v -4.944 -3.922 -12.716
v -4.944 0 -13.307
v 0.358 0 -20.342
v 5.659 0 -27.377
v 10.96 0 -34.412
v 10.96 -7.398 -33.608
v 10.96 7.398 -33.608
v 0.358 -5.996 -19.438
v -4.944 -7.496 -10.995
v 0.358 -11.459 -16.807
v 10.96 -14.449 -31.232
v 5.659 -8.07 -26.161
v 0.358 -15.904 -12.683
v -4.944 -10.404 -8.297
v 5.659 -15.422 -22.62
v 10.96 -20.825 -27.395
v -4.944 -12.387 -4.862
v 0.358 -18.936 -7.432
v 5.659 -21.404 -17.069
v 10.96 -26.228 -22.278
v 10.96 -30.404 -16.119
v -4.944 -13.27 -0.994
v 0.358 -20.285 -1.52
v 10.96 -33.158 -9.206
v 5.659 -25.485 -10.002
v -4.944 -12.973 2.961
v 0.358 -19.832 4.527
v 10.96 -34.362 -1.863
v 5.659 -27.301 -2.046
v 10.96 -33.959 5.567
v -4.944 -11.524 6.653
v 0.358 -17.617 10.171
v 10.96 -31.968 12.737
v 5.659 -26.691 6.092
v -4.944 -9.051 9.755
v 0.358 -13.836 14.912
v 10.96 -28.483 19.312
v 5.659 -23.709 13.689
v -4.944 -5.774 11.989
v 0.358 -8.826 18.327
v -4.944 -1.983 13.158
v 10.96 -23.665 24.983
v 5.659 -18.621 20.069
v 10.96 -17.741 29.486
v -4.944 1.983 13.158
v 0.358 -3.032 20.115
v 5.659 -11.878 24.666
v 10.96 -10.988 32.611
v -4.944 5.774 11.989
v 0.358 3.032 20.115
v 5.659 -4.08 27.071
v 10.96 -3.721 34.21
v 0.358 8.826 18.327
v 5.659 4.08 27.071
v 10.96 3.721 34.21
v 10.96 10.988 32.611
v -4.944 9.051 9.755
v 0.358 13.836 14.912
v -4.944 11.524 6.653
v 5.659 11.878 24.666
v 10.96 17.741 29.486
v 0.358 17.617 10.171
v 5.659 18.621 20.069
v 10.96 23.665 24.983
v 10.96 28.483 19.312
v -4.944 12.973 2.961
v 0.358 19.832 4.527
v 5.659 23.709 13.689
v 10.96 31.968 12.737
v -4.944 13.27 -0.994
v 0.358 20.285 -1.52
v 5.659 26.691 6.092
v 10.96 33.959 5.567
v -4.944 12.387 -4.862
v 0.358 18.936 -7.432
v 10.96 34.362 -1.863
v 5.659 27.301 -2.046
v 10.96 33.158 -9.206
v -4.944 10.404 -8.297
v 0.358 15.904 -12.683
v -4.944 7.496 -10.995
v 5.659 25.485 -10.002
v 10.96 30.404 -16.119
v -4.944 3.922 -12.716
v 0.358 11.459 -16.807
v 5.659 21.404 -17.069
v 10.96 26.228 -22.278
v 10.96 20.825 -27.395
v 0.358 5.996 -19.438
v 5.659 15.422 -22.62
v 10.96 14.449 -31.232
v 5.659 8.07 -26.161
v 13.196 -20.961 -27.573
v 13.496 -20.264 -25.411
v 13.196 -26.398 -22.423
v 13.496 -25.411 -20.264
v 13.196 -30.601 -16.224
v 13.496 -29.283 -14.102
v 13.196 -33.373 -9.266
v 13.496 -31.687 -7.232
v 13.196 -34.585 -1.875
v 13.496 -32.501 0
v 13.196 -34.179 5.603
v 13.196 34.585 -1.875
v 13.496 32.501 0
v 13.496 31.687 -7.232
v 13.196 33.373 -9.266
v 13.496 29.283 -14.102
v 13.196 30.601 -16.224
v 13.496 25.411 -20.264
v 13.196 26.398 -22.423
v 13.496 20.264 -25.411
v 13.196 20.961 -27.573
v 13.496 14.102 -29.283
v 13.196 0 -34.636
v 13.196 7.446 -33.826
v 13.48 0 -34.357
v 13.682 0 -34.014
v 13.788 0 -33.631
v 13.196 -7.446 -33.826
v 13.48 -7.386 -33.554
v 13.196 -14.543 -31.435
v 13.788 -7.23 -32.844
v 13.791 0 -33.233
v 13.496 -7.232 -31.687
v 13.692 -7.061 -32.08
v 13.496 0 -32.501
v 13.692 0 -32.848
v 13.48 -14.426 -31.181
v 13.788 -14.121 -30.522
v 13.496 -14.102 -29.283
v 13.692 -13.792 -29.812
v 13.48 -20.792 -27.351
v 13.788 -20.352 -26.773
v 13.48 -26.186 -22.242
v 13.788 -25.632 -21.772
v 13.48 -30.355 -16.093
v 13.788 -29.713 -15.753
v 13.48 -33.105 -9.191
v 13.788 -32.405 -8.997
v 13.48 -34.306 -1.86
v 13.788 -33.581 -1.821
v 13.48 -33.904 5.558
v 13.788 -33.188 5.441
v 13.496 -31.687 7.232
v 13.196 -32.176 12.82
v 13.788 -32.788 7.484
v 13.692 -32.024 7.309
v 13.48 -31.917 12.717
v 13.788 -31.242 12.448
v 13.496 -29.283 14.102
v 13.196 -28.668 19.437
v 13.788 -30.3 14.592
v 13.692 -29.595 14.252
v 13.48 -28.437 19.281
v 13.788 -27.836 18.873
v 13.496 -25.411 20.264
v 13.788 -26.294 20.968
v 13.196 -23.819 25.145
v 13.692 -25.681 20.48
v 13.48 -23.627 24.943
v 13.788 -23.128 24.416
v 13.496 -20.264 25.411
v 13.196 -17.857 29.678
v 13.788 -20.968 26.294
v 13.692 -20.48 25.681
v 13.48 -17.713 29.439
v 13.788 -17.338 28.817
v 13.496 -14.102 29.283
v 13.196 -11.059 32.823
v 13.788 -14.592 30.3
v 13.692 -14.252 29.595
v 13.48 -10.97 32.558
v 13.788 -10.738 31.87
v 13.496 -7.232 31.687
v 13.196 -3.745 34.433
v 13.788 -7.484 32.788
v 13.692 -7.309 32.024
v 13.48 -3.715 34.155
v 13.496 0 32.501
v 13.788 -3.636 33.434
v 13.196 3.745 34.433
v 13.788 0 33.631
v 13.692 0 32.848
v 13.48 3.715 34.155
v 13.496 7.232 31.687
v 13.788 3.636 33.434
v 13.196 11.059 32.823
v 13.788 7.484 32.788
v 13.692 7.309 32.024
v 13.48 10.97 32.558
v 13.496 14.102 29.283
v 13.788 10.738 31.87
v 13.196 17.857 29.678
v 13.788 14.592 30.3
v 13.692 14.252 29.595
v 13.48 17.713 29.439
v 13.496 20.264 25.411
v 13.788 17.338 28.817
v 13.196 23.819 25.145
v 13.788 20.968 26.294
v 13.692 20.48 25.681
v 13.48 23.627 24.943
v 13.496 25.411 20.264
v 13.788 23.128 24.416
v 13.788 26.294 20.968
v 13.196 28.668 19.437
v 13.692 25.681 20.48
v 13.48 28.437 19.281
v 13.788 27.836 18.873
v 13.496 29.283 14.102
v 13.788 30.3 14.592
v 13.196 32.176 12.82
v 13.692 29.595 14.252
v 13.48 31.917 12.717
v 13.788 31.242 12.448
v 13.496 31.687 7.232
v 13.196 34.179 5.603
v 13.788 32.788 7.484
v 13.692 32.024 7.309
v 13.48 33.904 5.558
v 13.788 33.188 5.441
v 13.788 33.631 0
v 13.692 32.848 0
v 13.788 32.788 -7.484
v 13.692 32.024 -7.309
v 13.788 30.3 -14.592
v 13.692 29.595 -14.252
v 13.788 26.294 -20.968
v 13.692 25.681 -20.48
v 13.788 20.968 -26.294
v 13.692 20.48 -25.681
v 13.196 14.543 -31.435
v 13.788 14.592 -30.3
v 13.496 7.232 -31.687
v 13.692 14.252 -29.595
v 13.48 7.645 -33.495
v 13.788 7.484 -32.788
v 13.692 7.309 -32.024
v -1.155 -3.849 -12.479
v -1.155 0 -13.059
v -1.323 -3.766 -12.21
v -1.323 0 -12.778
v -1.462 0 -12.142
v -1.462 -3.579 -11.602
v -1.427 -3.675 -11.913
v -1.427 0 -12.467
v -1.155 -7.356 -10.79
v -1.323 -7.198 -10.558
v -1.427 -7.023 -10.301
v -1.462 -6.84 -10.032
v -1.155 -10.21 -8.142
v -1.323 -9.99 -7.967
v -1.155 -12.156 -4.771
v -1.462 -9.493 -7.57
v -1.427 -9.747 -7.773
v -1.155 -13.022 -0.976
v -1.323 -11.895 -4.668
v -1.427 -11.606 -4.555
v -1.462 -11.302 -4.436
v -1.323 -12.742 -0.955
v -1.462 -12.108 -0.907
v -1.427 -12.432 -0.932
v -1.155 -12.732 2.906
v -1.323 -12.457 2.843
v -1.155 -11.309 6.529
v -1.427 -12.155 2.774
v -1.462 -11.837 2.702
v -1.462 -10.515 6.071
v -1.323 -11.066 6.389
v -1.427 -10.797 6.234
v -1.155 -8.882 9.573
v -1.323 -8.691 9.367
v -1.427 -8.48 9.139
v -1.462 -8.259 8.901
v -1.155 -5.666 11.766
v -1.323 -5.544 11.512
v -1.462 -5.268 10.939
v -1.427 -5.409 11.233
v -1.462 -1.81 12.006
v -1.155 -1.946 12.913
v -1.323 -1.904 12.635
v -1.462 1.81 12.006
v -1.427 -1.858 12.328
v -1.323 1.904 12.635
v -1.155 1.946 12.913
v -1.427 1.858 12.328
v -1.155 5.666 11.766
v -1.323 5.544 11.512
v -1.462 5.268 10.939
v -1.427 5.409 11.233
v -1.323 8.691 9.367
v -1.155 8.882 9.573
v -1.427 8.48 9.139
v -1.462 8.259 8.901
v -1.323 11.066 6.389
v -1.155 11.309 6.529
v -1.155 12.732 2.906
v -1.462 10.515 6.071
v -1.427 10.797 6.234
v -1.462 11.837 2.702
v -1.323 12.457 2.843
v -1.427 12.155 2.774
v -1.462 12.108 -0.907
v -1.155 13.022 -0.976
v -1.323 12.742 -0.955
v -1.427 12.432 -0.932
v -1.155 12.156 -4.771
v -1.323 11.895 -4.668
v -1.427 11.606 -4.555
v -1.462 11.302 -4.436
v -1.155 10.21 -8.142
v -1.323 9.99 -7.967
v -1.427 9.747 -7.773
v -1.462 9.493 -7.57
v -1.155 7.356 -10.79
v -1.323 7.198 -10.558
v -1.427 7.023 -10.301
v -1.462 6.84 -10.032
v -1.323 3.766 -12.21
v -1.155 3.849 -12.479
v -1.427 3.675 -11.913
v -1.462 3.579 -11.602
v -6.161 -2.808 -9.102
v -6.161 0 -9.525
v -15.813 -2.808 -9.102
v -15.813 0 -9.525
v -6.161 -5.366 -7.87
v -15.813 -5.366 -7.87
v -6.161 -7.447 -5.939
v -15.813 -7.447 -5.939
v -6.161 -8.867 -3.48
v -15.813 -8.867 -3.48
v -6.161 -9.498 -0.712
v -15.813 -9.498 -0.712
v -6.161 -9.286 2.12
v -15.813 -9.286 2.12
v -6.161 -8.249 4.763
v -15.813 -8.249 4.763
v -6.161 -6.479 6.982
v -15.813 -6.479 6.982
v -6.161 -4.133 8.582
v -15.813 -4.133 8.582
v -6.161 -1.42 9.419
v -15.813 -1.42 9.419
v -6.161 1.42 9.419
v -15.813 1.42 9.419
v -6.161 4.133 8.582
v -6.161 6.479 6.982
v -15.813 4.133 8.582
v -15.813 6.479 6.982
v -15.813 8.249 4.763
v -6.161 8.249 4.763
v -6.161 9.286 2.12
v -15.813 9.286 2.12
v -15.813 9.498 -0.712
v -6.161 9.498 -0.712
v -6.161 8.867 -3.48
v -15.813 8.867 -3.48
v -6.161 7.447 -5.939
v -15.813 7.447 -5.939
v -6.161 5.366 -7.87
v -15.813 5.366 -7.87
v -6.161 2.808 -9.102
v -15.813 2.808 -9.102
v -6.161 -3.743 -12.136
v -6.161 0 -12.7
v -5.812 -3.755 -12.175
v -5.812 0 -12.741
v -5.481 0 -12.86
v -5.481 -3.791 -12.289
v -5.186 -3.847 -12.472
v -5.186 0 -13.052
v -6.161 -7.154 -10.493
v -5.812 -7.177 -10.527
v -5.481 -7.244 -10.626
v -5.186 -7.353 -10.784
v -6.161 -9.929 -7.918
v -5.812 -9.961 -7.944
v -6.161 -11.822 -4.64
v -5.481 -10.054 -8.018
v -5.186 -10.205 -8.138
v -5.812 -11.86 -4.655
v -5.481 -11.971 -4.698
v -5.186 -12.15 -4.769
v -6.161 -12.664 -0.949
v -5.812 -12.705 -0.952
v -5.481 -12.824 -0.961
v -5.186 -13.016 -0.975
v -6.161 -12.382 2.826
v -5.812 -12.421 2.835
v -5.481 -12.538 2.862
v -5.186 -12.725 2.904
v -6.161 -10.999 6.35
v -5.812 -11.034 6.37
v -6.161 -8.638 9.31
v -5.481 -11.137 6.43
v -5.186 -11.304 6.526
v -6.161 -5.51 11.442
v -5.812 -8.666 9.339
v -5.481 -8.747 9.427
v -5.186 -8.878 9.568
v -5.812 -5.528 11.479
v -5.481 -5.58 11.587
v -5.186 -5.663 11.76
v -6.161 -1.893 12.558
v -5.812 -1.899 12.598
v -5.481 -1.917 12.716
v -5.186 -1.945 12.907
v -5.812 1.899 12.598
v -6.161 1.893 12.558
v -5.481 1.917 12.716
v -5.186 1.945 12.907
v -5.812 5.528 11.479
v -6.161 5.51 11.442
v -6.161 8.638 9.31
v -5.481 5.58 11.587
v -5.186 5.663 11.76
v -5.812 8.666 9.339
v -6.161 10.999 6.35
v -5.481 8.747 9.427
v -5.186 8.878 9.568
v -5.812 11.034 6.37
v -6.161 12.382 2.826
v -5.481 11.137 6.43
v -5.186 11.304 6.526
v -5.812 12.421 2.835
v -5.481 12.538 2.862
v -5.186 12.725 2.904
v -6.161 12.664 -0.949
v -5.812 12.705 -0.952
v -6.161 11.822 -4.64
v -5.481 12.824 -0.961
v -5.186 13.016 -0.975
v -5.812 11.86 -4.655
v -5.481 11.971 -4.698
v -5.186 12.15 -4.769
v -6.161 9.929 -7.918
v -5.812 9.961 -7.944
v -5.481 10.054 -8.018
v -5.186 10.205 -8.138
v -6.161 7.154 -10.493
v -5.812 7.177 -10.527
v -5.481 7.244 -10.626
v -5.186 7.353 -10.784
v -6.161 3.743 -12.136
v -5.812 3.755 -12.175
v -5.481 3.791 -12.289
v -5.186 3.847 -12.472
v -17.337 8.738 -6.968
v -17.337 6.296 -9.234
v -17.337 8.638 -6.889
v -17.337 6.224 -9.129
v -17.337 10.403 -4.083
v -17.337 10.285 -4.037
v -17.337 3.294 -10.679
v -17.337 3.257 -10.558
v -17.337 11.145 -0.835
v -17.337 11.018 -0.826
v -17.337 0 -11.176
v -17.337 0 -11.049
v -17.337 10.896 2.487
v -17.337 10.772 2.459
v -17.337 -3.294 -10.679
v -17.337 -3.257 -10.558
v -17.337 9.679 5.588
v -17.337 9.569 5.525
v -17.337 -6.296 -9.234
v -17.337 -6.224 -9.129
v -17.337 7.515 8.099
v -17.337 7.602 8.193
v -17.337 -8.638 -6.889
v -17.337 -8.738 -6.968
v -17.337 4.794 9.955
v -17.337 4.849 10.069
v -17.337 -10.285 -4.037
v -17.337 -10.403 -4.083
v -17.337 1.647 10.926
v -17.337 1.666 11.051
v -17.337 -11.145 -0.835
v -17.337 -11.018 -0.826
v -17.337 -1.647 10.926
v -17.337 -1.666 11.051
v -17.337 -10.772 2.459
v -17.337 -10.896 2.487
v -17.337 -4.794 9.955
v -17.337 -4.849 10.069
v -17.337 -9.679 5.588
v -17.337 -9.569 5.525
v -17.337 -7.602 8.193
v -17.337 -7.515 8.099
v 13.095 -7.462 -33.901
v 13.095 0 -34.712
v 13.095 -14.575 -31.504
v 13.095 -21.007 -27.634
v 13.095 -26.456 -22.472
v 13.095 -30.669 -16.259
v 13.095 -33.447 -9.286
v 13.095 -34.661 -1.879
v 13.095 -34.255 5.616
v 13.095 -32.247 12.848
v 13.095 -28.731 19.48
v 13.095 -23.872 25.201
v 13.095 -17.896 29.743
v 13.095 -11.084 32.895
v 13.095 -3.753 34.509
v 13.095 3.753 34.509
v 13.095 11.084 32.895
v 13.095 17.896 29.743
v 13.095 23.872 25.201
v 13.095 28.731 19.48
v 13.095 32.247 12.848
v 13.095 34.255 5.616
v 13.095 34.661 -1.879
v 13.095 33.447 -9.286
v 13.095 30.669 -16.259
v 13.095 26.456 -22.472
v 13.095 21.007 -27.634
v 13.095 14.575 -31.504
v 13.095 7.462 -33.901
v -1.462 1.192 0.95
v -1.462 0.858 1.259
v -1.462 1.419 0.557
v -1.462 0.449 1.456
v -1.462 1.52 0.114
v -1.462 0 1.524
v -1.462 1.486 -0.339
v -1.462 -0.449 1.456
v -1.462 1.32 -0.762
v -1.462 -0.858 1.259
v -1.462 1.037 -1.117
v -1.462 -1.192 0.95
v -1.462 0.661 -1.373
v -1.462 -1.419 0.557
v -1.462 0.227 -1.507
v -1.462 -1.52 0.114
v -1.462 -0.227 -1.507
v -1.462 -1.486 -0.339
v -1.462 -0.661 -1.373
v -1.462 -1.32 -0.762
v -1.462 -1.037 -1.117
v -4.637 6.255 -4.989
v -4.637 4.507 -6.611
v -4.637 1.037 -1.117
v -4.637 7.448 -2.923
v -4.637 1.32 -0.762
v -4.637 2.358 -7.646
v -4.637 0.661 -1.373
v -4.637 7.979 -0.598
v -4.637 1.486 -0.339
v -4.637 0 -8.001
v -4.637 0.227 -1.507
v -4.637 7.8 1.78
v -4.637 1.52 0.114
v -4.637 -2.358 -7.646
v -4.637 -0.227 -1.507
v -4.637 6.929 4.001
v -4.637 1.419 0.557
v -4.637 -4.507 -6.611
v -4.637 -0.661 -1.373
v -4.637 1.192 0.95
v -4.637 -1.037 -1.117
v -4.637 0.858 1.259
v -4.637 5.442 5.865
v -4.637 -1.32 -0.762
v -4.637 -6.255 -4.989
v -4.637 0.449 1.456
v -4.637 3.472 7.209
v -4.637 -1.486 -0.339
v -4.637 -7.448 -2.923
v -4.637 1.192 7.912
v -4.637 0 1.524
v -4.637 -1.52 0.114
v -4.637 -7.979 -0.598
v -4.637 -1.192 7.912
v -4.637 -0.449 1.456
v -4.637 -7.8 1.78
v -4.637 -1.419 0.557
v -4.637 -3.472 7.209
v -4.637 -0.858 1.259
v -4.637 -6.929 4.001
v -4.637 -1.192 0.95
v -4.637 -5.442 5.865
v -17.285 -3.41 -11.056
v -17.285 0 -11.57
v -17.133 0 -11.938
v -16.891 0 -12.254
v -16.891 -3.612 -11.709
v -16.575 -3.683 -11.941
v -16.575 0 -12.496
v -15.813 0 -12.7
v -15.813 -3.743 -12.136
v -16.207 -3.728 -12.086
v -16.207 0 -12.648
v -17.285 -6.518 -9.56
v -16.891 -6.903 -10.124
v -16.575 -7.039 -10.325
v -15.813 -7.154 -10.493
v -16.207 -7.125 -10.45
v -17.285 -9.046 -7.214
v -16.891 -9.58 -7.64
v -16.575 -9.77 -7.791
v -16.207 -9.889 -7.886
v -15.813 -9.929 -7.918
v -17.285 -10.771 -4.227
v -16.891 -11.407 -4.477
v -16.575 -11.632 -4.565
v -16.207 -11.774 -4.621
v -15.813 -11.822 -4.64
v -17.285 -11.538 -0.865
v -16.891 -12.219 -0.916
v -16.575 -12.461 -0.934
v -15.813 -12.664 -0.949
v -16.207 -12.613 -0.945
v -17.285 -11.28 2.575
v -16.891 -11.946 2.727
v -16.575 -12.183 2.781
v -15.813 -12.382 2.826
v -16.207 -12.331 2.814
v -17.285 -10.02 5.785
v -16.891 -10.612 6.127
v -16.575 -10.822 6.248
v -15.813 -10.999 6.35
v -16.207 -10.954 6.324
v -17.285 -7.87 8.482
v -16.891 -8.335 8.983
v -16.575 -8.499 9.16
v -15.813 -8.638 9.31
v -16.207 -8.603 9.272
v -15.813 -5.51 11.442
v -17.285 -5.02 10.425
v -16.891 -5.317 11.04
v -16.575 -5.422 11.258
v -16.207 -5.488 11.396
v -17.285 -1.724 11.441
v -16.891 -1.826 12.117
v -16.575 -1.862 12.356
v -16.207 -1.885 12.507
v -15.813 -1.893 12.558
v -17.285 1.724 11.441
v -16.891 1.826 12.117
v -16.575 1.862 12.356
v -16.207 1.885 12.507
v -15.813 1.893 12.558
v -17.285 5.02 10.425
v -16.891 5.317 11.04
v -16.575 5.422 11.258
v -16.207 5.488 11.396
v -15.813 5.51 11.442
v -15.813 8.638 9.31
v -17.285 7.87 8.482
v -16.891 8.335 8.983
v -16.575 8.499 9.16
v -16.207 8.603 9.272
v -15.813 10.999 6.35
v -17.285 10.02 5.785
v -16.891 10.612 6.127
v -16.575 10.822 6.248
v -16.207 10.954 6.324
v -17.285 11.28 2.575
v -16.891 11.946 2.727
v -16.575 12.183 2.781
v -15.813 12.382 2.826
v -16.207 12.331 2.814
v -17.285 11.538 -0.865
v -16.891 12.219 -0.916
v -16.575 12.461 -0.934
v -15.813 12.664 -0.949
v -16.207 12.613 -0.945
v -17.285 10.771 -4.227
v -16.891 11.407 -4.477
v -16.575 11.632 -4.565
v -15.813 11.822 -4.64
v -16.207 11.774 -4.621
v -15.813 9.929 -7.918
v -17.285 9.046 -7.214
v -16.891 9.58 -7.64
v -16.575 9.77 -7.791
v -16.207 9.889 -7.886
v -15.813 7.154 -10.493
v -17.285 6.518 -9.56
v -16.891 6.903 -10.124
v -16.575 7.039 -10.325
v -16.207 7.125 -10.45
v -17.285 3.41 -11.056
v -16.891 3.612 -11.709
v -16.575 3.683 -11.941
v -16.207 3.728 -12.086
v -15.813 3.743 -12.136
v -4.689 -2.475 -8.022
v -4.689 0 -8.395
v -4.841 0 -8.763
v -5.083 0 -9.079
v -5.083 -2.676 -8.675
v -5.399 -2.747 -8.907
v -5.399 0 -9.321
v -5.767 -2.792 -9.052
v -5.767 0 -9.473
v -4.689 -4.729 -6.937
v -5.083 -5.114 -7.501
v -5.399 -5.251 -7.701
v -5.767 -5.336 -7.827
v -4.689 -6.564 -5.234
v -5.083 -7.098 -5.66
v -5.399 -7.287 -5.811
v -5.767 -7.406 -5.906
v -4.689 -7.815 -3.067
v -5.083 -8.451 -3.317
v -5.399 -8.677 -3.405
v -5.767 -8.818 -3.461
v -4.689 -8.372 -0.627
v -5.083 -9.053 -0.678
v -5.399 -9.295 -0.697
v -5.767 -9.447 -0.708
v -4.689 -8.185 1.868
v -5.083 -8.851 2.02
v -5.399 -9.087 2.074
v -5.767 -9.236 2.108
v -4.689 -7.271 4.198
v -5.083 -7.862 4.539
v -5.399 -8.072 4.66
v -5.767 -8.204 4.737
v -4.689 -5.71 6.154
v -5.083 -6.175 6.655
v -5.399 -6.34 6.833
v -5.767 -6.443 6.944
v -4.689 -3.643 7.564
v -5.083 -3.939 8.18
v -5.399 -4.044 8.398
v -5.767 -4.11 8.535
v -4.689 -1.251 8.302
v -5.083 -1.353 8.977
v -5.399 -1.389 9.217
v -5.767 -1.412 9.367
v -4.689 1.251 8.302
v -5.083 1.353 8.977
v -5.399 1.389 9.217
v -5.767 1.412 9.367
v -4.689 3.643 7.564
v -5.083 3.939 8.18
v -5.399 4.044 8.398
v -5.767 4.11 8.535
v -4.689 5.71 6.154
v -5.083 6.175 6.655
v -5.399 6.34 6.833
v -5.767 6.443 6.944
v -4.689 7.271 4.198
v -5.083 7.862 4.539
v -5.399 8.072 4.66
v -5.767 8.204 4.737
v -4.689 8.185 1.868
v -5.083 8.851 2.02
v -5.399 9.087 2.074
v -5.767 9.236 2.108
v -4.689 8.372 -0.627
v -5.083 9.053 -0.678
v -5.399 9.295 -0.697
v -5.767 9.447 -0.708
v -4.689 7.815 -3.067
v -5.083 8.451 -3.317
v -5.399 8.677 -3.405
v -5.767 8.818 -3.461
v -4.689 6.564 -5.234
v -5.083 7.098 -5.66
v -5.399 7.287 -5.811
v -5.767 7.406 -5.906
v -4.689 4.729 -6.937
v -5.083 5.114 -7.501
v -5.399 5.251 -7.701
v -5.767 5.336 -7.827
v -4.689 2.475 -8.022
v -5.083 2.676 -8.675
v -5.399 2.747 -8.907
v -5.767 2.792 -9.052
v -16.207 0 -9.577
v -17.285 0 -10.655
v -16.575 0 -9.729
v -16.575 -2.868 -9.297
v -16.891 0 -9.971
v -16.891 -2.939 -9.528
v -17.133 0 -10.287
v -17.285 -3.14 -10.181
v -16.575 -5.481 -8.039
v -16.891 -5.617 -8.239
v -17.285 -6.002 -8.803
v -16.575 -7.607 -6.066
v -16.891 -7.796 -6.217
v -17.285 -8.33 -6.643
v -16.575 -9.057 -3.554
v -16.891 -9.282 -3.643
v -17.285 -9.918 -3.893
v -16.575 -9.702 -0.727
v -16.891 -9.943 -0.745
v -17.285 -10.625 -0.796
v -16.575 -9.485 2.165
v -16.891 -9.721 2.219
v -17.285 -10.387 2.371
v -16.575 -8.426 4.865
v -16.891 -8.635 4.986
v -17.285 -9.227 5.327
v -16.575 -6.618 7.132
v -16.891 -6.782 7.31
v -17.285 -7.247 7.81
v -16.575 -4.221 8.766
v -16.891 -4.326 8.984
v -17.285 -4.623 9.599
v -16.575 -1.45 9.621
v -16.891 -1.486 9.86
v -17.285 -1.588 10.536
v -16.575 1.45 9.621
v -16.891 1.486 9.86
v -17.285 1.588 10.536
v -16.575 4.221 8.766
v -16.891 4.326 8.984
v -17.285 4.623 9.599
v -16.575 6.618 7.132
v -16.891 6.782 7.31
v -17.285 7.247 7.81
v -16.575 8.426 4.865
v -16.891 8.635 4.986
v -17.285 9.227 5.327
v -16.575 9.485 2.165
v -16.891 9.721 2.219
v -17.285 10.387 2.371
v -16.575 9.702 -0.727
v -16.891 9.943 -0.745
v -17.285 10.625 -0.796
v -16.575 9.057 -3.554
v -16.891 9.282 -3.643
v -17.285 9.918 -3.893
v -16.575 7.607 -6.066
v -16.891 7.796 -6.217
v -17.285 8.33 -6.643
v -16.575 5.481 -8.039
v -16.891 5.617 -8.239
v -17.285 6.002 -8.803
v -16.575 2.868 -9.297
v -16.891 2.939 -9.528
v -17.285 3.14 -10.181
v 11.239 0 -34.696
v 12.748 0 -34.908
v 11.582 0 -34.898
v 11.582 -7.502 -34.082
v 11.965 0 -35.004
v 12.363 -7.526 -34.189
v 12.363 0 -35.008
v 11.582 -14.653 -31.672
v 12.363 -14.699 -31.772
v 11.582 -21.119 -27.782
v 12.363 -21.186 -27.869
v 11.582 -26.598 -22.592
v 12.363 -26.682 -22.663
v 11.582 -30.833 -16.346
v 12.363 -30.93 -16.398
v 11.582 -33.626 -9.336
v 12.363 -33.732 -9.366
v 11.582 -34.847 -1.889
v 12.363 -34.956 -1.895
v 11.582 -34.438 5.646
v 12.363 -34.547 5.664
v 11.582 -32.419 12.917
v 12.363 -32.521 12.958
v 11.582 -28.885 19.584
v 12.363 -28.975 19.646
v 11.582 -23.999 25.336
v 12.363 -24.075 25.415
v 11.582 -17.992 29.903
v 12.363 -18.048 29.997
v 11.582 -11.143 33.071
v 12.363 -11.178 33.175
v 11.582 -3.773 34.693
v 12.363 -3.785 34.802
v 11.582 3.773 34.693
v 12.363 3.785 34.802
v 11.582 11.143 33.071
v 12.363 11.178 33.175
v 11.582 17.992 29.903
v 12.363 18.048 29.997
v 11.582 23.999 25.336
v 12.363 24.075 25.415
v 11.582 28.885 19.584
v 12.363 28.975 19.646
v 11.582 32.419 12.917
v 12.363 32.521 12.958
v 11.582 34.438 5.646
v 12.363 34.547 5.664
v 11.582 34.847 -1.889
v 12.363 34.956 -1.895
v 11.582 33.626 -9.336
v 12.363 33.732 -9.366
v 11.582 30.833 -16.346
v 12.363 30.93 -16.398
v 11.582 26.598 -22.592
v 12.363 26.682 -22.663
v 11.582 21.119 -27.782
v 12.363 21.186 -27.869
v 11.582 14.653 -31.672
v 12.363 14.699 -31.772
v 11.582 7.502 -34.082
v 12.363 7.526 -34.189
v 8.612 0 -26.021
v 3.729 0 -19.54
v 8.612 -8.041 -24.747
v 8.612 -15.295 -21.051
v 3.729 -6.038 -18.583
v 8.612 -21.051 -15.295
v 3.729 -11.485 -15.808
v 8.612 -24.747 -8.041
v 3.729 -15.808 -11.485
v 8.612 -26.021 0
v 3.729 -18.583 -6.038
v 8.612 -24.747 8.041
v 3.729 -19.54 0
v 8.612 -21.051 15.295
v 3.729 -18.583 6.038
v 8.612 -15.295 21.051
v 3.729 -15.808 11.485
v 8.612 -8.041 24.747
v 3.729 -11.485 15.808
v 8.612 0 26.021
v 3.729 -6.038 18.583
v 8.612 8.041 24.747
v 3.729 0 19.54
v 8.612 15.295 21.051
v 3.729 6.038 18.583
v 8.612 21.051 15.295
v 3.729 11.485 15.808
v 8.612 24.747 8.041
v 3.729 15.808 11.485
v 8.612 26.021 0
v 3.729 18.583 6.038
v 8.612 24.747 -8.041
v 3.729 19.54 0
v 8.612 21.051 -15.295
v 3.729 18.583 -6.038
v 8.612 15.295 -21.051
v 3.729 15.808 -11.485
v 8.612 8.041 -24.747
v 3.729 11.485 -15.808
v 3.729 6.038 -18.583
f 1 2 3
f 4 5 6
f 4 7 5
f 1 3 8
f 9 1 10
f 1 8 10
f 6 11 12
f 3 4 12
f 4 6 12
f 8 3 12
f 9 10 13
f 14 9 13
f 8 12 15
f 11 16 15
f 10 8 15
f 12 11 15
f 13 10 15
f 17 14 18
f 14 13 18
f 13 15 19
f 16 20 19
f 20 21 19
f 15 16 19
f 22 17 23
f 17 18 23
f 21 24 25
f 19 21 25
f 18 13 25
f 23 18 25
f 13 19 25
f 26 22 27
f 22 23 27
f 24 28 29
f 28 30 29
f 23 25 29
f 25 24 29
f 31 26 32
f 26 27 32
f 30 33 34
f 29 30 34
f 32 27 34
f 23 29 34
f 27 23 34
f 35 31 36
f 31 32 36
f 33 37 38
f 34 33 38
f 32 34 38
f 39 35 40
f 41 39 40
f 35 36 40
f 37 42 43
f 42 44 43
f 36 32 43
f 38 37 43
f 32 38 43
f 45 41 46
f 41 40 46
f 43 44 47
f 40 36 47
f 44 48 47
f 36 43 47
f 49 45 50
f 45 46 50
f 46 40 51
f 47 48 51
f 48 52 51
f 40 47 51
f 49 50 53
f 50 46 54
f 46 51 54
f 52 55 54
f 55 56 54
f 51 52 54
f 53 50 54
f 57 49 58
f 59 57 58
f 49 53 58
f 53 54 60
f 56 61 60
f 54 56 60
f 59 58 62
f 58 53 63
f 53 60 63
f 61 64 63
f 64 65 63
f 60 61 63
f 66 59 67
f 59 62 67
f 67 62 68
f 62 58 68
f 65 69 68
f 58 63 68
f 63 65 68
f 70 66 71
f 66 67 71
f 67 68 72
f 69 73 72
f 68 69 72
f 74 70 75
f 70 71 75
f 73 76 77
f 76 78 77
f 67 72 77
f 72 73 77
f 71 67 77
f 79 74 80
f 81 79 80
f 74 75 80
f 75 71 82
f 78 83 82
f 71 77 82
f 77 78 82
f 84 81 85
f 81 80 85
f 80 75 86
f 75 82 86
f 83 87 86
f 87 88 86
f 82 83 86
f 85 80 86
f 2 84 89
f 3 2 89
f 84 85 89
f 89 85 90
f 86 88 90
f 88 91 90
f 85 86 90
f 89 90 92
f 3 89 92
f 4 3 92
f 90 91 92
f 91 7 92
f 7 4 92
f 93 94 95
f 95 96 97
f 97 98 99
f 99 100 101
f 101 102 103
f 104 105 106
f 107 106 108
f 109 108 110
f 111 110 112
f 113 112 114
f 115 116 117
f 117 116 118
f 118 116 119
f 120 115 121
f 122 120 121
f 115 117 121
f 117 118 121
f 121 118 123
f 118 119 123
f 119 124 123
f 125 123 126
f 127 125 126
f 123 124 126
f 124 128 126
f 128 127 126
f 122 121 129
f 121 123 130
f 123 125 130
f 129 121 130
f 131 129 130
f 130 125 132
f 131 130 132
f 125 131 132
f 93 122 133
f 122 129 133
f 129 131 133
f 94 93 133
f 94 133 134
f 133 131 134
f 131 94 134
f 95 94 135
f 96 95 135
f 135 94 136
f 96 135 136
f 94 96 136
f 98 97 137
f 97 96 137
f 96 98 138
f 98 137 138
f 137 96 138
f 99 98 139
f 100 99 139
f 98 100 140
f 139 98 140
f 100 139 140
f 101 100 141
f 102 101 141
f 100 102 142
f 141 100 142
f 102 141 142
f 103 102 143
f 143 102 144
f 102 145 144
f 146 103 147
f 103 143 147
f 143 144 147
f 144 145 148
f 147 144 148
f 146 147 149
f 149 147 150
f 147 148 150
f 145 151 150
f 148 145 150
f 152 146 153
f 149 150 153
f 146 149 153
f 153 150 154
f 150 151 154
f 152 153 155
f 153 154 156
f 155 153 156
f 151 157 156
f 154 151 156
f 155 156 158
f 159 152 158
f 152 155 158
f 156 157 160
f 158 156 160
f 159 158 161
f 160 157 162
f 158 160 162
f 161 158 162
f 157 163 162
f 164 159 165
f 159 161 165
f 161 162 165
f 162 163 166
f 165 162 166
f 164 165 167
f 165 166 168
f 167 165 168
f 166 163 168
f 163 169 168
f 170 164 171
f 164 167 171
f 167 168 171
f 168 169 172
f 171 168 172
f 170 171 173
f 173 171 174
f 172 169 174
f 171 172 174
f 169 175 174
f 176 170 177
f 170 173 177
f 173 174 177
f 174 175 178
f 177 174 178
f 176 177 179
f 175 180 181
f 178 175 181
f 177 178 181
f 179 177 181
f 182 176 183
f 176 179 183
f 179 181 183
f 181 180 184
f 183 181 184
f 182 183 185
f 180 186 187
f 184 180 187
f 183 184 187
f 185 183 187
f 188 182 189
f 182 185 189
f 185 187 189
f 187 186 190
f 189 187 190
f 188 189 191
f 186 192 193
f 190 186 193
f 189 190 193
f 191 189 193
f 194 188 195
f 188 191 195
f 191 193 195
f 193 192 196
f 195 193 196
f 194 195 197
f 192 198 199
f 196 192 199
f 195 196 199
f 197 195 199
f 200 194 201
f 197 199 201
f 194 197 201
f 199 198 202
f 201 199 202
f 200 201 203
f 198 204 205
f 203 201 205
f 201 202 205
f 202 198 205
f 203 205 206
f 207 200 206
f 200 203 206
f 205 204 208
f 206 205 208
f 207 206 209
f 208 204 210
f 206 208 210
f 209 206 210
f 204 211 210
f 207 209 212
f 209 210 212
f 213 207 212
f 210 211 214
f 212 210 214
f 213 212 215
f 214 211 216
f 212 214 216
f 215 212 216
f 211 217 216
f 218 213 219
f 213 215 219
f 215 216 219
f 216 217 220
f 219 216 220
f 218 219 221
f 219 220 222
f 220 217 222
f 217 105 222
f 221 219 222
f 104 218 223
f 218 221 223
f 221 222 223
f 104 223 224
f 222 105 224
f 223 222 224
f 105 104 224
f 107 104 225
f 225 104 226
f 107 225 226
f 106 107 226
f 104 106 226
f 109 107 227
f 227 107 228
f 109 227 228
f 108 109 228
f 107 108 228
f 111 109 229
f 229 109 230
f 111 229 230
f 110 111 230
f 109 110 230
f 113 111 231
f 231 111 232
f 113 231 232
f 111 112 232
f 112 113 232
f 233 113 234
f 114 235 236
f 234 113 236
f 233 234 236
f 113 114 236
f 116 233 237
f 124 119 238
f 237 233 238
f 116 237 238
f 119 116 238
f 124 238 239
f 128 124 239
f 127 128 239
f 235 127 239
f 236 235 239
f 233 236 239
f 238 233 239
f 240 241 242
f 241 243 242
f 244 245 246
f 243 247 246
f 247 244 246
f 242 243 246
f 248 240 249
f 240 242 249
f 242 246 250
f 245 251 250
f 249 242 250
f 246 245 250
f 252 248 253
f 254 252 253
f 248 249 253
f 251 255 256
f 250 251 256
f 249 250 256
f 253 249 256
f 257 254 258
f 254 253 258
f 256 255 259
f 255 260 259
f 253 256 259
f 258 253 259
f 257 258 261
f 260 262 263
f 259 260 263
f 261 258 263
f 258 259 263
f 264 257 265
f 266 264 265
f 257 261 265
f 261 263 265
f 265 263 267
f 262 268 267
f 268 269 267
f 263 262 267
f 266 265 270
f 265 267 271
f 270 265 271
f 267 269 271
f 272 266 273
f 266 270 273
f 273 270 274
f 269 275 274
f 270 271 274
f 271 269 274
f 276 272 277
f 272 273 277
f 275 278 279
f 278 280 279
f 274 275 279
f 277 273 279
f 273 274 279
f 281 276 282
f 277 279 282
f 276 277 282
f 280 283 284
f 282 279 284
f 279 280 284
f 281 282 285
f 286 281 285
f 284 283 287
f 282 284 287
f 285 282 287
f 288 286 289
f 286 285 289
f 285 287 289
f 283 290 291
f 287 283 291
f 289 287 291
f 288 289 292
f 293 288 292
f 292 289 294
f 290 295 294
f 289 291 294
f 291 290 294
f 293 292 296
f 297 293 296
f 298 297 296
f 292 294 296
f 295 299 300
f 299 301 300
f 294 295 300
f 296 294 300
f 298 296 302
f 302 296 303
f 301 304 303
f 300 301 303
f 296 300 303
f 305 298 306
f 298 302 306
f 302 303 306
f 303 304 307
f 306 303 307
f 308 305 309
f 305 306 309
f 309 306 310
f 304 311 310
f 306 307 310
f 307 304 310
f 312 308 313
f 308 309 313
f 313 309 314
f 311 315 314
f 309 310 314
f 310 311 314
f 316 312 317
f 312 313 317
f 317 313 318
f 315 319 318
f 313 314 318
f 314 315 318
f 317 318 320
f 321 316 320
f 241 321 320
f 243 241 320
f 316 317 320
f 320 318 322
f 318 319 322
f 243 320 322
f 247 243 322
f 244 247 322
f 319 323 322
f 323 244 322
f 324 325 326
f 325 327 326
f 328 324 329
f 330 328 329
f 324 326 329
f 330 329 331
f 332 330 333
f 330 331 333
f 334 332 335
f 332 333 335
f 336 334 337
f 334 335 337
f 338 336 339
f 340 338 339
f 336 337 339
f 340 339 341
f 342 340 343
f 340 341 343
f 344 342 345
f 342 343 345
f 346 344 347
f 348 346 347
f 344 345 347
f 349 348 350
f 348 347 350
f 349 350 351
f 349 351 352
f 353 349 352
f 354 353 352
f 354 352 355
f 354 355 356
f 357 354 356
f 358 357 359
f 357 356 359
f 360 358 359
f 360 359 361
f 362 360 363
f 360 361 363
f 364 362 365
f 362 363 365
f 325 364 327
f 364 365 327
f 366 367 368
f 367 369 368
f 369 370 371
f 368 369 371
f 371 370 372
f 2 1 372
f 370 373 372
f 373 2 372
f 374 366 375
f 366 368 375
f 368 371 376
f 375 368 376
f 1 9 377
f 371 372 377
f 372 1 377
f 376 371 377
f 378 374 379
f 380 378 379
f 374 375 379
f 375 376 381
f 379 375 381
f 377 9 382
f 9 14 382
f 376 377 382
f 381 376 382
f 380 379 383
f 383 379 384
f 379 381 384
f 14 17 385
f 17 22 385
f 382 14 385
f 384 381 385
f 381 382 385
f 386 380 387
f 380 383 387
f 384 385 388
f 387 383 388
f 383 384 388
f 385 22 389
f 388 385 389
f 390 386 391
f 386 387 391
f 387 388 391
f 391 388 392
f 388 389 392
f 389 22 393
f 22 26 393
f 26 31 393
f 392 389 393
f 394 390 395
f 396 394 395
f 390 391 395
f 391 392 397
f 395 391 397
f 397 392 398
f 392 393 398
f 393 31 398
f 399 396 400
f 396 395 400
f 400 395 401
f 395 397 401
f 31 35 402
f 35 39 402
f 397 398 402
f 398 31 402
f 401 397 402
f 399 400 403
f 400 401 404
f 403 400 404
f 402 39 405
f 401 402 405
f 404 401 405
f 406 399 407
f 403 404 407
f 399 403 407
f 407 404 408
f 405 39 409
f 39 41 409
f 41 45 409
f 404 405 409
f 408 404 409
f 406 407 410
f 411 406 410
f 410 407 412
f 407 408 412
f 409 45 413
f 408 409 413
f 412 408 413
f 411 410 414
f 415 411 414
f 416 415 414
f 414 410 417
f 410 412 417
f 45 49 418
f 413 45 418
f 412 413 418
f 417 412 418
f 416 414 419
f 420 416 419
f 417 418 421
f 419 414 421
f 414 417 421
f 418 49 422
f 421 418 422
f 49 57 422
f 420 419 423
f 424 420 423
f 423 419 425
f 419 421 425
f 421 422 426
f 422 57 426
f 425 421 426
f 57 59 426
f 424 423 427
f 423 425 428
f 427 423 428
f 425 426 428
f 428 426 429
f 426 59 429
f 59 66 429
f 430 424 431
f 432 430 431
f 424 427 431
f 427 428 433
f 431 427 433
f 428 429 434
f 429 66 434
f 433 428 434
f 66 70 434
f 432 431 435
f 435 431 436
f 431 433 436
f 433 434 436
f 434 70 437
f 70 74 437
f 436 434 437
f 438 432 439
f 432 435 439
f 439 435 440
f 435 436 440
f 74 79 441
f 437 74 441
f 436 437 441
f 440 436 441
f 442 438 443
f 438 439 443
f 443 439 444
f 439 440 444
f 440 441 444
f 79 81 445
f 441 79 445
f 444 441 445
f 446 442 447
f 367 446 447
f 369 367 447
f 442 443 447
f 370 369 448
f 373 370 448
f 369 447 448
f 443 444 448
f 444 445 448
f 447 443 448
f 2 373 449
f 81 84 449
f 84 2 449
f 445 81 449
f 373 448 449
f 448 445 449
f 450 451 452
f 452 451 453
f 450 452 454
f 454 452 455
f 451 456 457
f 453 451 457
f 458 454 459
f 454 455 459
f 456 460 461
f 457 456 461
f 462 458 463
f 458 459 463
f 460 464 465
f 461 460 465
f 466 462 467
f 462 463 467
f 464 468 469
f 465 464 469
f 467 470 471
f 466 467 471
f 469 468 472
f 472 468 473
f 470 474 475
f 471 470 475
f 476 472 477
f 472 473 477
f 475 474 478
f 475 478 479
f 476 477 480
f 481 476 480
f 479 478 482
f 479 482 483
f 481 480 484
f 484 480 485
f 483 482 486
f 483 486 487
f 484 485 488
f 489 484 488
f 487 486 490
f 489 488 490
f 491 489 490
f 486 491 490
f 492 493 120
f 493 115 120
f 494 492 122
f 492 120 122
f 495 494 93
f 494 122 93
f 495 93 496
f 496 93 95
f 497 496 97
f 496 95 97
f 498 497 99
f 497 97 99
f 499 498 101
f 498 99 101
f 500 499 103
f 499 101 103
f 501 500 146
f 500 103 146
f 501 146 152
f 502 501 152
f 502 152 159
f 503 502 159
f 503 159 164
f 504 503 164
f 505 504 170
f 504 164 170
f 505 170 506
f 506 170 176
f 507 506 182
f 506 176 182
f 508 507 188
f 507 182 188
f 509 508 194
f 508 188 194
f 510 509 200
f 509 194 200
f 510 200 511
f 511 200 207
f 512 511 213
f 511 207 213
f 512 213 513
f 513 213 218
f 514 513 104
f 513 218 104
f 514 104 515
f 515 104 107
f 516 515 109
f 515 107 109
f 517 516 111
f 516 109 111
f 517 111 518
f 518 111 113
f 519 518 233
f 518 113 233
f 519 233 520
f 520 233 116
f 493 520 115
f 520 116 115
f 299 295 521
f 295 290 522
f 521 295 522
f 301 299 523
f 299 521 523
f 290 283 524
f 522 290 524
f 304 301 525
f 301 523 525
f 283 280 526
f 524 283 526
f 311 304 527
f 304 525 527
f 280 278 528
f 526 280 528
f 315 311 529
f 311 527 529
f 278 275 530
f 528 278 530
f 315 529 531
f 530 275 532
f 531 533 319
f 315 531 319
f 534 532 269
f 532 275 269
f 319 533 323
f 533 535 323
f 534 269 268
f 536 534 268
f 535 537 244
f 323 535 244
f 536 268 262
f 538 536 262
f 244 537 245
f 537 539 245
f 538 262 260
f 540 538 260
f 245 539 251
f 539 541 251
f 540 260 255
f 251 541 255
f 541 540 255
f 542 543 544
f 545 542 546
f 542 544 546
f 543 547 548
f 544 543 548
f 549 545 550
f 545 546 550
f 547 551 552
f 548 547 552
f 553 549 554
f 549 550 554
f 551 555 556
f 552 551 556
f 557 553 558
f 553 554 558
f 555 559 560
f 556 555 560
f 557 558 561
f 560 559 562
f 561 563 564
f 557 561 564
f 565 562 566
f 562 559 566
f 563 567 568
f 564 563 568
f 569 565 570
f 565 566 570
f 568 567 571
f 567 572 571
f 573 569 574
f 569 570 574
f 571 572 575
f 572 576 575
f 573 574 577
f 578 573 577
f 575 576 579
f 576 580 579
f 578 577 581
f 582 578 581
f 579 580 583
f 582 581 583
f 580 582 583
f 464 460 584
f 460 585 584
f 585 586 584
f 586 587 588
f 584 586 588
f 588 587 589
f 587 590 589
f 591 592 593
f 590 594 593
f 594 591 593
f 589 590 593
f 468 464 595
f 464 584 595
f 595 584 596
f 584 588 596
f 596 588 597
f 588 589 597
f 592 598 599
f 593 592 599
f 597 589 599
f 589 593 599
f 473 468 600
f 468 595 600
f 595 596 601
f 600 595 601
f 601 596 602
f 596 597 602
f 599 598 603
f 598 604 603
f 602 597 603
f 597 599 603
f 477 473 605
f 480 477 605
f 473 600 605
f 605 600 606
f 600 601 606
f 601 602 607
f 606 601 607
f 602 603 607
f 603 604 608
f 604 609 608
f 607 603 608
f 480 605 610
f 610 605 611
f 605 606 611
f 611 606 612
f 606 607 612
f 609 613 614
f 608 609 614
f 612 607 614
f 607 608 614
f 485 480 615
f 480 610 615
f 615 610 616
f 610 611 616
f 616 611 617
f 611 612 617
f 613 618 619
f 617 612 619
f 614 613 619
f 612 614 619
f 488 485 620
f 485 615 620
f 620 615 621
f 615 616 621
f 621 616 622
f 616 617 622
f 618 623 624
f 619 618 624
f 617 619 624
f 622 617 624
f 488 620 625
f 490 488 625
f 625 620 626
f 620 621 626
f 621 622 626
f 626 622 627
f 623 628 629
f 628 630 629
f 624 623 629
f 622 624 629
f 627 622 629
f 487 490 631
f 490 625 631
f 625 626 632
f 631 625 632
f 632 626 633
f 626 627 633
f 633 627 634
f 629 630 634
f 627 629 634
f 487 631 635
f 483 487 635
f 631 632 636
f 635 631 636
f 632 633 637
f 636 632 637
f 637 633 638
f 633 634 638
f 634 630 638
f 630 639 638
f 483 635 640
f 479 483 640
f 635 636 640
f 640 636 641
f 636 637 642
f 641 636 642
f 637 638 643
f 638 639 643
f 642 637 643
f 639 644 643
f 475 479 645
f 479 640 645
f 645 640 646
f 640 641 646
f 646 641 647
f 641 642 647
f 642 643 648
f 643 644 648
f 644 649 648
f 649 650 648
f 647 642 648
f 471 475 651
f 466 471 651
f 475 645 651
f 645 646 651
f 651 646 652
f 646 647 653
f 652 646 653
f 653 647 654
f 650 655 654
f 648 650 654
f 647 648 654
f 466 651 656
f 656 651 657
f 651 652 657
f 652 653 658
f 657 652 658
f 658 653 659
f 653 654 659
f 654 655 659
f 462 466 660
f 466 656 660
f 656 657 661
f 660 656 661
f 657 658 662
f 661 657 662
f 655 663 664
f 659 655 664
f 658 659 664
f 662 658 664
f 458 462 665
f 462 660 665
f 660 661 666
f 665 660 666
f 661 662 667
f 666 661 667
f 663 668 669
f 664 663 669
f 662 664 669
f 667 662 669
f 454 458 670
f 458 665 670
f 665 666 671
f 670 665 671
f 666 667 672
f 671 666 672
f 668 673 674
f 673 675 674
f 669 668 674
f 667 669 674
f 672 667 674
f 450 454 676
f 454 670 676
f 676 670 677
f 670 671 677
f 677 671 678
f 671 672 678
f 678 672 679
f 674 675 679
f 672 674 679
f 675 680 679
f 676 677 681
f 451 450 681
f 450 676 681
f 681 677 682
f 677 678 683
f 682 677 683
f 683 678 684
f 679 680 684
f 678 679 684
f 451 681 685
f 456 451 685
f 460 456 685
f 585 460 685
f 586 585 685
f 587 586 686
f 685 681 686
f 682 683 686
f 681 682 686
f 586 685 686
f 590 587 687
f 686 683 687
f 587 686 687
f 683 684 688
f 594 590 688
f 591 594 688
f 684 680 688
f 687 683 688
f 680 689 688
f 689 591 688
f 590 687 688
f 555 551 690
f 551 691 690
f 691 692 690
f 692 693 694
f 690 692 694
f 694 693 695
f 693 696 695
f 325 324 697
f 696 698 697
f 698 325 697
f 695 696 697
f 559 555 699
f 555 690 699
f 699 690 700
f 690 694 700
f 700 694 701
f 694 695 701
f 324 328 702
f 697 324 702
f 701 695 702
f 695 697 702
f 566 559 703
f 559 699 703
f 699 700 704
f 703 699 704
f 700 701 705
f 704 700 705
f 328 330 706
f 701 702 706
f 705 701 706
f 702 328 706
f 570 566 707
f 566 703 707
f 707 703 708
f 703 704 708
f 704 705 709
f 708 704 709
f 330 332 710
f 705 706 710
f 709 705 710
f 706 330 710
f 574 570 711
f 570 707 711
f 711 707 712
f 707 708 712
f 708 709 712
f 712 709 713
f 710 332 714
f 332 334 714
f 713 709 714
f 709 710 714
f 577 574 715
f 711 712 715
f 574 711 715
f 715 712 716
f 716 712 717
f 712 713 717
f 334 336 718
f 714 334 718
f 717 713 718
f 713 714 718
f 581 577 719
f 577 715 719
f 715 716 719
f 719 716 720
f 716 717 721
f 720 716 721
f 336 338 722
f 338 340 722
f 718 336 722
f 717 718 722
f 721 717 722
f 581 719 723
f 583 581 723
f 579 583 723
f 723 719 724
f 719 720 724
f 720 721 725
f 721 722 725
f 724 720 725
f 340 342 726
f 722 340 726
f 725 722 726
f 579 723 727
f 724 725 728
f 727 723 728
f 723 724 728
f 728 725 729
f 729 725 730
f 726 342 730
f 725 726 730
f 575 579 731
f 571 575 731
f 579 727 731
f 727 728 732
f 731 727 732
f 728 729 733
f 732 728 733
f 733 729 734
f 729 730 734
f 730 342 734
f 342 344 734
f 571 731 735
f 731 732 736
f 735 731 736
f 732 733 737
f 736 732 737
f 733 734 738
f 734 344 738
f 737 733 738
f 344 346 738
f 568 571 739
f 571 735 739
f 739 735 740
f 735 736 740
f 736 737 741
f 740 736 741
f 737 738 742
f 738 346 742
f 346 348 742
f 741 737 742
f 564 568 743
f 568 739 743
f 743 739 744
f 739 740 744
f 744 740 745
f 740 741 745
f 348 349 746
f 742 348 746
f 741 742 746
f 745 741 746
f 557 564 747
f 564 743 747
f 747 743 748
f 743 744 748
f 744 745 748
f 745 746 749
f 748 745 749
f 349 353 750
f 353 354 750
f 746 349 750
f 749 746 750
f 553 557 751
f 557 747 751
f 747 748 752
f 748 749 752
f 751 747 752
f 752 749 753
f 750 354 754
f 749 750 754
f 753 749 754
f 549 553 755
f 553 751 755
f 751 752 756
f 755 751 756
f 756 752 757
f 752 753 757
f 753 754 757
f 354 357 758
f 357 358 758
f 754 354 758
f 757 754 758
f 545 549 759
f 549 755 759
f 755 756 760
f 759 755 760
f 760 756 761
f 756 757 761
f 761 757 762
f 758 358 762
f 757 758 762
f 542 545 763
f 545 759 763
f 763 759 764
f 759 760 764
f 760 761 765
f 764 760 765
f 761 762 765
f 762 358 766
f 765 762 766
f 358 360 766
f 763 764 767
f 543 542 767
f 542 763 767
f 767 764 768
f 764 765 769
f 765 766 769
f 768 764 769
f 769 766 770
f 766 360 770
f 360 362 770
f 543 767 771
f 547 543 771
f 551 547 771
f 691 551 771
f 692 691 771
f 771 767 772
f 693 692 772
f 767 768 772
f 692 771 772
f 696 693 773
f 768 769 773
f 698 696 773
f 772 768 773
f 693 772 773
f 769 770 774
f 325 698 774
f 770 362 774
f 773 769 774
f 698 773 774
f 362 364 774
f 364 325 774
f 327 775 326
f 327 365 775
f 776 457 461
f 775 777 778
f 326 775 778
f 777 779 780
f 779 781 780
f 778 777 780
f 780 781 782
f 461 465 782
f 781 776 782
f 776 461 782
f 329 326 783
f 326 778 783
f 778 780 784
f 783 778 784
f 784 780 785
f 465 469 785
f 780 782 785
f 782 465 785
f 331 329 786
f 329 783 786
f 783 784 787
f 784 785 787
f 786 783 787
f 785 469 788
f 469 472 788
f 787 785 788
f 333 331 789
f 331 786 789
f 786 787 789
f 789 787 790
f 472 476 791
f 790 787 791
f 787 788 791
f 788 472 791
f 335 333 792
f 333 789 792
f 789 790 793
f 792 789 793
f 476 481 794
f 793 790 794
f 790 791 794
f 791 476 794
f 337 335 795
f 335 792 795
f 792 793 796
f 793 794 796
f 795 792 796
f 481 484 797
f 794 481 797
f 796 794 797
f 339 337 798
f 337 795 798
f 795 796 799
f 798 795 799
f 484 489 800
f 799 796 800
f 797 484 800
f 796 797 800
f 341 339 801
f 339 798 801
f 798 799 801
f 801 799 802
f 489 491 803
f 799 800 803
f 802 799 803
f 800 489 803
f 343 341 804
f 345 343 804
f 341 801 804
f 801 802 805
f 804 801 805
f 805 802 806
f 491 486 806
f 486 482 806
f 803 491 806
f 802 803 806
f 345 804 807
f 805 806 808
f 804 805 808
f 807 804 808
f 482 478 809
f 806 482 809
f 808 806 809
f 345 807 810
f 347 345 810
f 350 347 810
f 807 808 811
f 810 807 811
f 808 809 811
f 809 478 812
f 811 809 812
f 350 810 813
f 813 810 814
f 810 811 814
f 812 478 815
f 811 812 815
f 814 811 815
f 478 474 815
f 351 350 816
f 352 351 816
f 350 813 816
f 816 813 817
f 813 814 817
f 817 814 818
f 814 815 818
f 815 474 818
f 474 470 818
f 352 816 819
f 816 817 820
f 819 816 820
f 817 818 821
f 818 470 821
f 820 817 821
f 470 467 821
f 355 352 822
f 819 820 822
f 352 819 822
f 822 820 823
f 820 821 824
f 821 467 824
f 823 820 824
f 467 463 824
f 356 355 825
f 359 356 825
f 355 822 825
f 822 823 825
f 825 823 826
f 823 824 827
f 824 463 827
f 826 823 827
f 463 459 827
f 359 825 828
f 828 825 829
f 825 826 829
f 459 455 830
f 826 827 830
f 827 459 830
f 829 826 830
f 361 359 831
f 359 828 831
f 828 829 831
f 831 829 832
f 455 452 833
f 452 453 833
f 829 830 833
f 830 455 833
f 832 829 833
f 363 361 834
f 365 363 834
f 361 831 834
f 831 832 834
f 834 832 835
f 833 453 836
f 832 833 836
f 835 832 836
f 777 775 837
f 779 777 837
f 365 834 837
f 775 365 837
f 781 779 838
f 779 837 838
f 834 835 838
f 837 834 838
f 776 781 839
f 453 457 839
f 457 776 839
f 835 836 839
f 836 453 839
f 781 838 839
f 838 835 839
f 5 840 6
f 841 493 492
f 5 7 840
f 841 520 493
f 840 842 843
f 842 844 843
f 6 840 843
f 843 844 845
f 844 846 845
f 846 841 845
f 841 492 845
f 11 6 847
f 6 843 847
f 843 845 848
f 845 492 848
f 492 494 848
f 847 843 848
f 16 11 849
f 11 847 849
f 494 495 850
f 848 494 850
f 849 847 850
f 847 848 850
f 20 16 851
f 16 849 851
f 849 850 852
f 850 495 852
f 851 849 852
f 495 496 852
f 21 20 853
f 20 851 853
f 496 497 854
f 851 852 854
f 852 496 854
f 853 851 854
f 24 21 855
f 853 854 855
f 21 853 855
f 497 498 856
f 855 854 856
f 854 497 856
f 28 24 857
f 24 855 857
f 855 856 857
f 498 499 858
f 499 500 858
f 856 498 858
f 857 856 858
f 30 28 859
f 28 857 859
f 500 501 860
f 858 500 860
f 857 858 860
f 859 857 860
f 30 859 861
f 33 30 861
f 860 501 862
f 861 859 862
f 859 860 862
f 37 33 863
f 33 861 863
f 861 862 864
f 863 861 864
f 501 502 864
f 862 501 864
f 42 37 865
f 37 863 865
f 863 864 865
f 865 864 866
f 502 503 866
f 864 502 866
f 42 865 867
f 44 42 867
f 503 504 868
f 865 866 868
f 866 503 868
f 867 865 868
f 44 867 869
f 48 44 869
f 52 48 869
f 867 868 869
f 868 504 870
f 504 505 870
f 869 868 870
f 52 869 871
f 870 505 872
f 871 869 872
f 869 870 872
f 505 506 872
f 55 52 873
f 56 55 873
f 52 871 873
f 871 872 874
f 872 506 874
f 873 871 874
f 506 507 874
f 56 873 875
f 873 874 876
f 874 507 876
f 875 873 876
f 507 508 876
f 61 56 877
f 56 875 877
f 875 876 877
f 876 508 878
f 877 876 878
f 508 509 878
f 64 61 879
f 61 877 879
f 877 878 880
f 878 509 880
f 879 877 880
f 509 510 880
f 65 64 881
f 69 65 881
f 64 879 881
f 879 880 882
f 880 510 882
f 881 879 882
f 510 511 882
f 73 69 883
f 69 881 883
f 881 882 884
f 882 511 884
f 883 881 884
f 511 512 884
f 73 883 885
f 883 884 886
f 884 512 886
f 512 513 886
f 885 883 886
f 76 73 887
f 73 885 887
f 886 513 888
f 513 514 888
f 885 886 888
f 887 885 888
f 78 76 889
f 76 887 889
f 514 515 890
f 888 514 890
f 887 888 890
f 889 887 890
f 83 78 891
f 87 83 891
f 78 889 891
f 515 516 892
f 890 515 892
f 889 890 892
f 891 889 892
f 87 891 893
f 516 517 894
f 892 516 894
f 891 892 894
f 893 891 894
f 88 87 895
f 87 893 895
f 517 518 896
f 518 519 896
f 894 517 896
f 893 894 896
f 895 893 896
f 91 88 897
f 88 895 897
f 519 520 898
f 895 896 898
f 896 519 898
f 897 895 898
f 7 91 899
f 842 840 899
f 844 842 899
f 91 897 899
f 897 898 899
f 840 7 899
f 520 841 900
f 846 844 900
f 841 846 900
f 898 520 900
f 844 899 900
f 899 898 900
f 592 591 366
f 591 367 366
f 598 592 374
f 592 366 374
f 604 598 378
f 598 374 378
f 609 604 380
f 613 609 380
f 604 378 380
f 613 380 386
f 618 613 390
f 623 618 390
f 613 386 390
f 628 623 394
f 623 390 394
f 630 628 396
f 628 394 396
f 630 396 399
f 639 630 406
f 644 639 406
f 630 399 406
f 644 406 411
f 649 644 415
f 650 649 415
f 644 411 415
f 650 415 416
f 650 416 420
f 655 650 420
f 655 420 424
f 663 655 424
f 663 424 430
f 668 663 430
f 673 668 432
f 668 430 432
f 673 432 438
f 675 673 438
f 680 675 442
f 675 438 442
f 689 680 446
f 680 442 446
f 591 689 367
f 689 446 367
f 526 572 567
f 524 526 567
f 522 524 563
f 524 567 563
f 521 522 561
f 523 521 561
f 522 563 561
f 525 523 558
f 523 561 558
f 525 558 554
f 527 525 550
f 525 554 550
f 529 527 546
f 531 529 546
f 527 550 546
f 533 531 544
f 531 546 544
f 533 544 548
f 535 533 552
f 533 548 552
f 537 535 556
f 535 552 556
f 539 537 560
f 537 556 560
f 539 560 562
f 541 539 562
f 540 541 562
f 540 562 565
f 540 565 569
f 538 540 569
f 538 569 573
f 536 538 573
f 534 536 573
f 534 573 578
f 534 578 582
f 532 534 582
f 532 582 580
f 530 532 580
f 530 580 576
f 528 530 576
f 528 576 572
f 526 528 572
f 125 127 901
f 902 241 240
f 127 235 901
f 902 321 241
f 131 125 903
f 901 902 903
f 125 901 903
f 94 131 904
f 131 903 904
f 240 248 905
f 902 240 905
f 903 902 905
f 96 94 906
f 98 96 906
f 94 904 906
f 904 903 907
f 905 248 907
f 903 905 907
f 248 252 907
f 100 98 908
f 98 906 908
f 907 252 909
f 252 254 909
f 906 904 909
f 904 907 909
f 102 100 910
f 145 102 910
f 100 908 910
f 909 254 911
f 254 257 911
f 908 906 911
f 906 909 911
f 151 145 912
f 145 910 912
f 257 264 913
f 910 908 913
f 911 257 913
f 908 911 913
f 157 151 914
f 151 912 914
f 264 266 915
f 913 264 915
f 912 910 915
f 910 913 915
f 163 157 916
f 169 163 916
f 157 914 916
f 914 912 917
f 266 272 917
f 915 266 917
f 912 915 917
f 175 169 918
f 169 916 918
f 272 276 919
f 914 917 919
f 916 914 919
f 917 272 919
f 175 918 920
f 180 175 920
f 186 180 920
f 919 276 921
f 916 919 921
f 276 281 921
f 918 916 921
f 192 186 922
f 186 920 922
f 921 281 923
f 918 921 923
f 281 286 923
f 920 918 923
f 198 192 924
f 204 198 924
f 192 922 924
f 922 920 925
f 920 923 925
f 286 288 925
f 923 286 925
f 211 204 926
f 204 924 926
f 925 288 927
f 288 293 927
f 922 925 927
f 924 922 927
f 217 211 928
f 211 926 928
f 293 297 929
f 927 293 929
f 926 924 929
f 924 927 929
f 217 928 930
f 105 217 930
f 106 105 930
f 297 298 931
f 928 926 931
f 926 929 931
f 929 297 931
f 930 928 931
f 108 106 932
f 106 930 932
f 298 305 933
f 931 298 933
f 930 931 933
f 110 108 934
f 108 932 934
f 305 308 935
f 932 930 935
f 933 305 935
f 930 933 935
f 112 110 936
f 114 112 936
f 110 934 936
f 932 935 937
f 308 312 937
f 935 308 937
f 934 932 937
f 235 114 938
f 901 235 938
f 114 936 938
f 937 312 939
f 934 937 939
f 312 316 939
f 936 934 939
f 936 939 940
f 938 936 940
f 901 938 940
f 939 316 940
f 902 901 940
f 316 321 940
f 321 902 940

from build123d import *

# Parameters (mm, degrees)
SKETCH3_R          = 1.524
CUT_EXTRUDE1_DEPTH = 19.439713487


with BuildPart() as part:
    # Sketch2 → Revolve1 (revolve)
    with BuildSketch(Plane(origin=(0, 0, 0), x_dir=(1, 0, 0), z_dir=(0, 1, 0))):
        with BuildLine():
            Line((-17.336950759, 11.049), (-17.336950759, 11.176))
            ThreePointArc((-17.336950759, 11.176), (-16.890581493, 12.253630735), (-15.812950759, 12.7))
            Line((-15.812950759, 12.7), (-6.160950759, 12.7))
            ThreePointArc((-6.160950759, 12.7), (-5.480945291, 12.860120033), (-4.943830241, 13.306833905))
            Line((-4.943830241, 13.306833905), (10.960215402, 34.412215318))
            ThreePointArc((10.960215402, 34.412215318), (11.965236113, 35.00421776), (13.094502014, 34.71216974))
            Line((13.094502014, 34.71216974), (13.195928724, 34.635739232))
            ThreePointArc((13.195928724, 34.635739232), (13.787931166, 33.630718521), (13.495883146, 32.50145262))
            Line((13.495883146, 32.50145262), (-1.155071276, 13.058979422))
            ThreePointArc((-1.155071276, 13.058979422), (-1.383196009, 12.625385623), (-1.461950759, 12.141813327))
            Line((-1.461950759, 12.141813327), (-1.461950759, 0))
            Line((-1.461950759, 0), (-4.636950759, 0))
            Line((-4.636950759, 0), (-4.636950759, 8.001))
            ThreePointArc((-4.636950759, 8.001), (-5.083320024, 9.078630735), (-6.160950759, 9.525))
            Line((-6.160950759, 9.525), (-15.812950759, 9.525))
            ThreePointArc((-15.812950759, 9.525), (-16.890581493, 9.971369265), (-17.336950759, 11.049))
        make_face()
    revolve(axis=Axis((-1.461950759, 0, 0), (-1, 0, 0)))

    # Sketch3 → Cut-Extrude1 (cut, through all)
    with BuildSketch(Plane.ZY.offset(4.636950759)):
        Circle(SKETCH3_R)
    extrude(amount=-CUT_EXTRUDE1_DEPTH, mode=Mode.SUBTRACT)


solid = part.part
